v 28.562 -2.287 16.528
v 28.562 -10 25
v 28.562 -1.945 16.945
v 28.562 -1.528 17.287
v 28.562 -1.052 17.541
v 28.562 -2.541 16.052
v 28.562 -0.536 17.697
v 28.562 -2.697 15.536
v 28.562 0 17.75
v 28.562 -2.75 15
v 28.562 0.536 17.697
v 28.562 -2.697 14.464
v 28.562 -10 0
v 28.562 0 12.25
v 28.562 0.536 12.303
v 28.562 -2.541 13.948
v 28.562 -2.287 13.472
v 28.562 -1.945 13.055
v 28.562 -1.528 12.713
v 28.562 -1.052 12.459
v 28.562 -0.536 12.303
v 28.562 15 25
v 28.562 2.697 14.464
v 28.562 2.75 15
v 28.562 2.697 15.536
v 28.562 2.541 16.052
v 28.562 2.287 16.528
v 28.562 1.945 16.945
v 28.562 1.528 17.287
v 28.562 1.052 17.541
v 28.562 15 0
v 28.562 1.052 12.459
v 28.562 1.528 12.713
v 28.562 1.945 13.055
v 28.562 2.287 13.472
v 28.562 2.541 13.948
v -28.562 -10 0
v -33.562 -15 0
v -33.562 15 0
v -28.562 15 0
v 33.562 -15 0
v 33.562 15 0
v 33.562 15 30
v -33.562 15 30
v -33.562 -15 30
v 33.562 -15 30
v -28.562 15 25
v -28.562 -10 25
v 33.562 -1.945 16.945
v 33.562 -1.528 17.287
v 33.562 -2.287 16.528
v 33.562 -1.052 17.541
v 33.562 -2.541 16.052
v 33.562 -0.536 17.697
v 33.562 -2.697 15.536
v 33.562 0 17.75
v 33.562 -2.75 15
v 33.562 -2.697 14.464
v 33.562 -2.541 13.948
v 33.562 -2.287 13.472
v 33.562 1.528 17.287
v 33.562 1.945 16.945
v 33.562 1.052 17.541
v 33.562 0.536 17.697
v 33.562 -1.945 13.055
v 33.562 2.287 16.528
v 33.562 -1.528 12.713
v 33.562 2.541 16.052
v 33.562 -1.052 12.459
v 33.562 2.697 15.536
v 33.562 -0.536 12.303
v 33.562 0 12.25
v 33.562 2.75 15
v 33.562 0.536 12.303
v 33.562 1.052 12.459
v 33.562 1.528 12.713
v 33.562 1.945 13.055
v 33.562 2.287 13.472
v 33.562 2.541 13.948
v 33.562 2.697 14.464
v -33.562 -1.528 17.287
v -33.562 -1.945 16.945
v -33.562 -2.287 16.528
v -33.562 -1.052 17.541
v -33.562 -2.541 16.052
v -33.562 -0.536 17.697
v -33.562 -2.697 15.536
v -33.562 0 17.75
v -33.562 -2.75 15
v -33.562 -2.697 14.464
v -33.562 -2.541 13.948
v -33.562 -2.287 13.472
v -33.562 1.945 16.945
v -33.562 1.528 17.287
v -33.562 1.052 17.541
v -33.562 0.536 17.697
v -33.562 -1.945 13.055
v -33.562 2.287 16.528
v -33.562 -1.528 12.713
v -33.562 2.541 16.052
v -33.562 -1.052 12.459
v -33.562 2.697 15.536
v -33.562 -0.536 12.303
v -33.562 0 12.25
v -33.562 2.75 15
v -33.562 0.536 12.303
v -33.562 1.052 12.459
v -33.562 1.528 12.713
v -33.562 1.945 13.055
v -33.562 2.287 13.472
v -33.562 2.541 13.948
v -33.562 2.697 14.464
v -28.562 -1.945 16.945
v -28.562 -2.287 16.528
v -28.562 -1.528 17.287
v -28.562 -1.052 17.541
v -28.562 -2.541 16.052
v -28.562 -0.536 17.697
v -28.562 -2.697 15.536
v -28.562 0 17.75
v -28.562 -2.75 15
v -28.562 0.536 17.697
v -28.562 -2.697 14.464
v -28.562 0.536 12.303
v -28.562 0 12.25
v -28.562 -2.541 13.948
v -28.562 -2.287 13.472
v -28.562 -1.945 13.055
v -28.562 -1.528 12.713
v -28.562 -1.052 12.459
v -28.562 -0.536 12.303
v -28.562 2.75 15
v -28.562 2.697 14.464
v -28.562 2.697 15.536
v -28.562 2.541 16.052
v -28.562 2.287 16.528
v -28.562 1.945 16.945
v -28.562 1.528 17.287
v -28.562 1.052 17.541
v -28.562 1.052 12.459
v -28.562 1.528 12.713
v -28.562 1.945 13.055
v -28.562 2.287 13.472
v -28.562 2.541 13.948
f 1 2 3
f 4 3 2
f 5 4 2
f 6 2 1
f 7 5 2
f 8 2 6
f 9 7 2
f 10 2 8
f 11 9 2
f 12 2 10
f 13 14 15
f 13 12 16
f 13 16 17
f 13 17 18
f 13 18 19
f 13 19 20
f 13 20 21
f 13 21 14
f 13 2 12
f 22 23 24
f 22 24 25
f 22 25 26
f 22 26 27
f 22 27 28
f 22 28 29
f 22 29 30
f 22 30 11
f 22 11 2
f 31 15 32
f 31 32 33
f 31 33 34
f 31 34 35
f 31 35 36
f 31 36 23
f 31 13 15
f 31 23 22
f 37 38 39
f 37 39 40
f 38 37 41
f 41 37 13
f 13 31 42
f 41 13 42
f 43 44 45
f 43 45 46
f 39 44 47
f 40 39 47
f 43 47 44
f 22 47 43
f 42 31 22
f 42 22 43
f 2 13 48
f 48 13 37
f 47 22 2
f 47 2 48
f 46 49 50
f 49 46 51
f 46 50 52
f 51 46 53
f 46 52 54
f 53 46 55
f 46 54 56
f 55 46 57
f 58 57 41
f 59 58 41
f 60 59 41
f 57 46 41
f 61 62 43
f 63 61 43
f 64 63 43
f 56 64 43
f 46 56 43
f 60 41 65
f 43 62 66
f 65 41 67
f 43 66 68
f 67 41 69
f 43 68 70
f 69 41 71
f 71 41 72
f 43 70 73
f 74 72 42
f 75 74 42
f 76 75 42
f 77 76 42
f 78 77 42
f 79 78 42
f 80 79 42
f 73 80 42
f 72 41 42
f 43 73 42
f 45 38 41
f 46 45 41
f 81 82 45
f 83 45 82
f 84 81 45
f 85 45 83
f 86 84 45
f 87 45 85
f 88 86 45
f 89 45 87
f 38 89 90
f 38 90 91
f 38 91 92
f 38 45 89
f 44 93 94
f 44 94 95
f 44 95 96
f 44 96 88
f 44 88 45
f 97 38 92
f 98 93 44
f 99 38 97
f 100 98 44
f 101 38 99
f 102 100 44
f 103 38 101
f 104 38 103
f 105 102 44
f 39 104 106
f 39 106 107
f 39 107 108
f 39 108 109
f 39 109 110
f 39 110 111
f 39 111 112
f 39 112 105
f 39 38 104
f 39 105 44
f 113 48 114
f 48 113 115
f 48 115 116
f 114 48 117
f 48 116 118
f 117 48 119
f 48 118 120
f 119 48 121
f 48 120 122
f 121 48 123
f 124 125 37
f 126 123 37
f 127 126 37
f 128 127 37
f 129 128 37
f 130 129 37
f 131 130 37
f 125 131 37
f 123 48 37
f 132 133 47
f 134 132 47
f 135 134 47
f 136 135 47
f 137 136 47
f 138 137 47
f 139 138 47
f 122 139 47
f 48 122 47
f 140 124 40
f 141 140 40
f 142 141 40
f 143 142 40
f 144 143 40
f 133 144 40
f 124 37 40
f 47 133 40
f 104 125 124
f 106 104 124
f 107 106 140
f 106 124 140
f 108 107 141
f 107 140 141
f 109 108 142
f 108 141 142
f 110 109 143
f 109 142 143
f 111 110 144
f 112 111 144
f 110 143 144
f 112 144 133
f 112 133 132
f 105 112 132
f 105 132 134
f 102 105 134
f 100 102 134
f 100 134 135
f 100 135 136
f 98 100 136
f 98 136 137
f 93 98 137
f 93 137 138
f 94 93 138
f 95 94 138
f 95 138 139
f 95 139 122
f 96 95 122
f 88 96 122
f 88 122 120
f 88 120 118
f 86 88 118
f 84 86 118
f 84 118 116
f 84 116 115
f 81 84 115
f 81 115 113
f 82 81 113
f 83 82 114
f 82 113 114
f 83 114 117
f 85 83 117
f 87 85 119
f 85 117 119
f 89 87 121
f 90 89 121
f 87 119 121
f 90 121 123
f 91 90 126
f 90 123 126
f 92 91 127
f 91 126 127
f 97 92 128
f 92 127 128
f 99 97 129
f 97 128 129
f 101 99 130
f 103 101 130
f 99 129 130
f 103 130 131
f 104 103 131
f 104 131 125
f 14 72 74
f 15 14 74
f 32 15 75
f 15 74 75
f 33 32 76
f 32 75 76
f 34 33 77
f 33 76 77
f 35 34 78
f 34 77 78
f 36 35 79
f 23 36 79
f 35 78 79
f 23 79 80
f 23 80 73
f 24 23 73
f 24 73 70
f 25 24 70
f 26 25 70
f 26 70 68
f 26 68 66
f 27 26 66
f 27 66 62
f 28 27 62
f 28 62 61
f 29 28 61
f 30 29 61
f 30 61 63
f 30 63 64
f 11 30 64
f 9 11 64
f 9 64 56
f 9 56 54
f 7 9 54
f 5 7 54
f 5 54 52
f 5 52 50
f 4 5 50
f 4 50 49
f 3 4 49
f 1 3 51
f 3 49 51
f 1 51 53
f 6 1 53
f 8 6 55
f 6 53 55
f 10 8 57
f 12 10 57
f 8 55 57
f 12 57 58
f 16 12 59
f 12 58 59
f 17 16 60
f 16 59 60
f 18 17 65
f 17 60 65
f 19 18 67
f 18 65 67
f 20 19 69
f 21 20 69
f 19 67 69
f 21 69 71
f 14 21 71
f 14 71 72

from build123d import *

# Parameters (mm, degrees)
SKETCH1_W           = 67.125
SKETCH1_H           = 30
BOSS_EXTRUDE1_DEPTH = 30
SKETCH2_W           = 57.125
SKETCH2_H           = 25
CUT_EXTRUDE1_DEPTH  = 25
SKETCH3_R           = 2.75
CUT_EXTRUDE2_DEPTH  = 76.038427655


with BuildPart() as part:
    # Sketch1 → Boss-Extrude1 (new body)
    with BuildSketch(Plane.XY):
        Rectangle(SKETCH1_W, SKETCH1_H)
    extrude(amount=BOSS_EXTRUDE1_DEPTH)

    # Sketch2 → Cut-Extrude1 (cut)
    with BuildSketch(Plane(origin=(0, 0, 0), x_dir=(-1, 0, 0), z_dir=(0, 0, -1))):
        with Locations((0, 2.5)):
            Rectangle(SKETCH2_W, SKETCH2_H)
    extrude(amount=-CUT_EXTRUDE1_DEPTH, mode=Mode.SUBTRACT)

    # Sketch3 → Cut-Extrude2 (cut, through all)
    with BuildSketch(Plane(origin=(33.5625, 0, 0), x_dir=(0, 0, -1), z_dir=(1, 0, 0))):
        with Locations((-15, 0)):
            Circle(SKETCH3_R)
    extrude(amount=-CUT_EXTRUDE2_DEPTH, mode=Mode.SUBTRACT)


solid = part.part
